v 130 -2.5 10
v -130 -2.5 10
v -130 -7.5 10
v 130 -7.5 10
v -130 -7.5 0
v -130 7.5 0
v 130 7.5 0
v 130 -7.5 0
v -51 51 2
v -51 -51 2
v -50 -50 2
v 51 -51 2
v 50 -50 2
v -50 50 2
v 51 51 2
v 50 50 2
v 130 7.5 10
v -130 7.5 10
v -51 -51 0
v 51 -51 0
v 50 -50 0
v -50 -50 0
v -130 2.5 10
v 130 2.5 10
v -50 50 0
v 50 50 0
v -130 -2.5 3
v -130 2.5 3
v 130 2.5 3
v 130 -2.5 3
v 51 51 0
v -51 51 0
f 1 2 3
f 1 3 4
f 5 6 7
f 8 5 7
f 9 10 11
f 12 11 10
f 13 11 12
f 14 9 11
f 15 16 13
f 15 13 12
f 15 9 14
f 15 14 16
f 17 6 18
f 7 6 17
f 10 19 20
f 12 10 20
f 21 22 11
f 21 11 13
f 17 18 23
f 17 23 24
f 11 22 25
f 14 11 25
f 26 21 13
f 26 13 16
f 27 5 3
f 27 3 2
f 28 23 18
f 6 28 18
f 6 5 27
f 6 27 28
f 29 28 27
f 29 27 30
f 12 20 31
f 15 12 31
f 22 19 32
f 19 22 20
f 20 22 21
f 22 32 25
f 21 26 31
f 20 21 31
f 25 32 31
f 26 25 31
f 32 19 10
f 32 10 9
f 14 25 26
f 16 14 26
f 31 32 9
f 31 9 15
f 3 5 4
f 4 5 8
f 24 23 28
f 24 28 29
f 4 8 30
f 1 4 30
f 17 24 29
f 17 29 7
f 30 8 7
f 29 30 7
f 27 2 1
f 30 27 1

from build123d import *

# Parameters (mm, degrees)
F0_W     = 102
F0_H     = 102
F0_W_2   = 100
F0_H_2   = 100
F1_DEPTH = 2
F2_W     = 260
F2_H     = 15
F3_DEPTH = 10
F4_W     = 260
F4_H     = 5
F5_DEPTH = 7


with BuildPart() as f1:
    # F0 (on Top) → F1 (new body)
    with BuildSketch(Plane.XY):
        Rectangle(F0_W, F0_H)
        Rectangle(F0_W_2, F0_H_2, mode=Mode.SUBTRACT)
    extrude(amount=F1_DEPTH)


with BuildPart() as f3:
    # F2 (on Top) → F3 (new body)
    with BuildSketch(Plane.XY):
        Rectangle(F2_W, F2_H)
    extrude(amount=F3_DEPTH)

    # F4 (on face) → F5 (cut)
    with BuildSketch(Plane.XY.offset(10)):
        Rectangle(F4_W, F4_H)
    extrude(amount=-F5_DEPTH, mode=Mode.SUBTRACT)


solid = Compound([f1.part, f3.part])
